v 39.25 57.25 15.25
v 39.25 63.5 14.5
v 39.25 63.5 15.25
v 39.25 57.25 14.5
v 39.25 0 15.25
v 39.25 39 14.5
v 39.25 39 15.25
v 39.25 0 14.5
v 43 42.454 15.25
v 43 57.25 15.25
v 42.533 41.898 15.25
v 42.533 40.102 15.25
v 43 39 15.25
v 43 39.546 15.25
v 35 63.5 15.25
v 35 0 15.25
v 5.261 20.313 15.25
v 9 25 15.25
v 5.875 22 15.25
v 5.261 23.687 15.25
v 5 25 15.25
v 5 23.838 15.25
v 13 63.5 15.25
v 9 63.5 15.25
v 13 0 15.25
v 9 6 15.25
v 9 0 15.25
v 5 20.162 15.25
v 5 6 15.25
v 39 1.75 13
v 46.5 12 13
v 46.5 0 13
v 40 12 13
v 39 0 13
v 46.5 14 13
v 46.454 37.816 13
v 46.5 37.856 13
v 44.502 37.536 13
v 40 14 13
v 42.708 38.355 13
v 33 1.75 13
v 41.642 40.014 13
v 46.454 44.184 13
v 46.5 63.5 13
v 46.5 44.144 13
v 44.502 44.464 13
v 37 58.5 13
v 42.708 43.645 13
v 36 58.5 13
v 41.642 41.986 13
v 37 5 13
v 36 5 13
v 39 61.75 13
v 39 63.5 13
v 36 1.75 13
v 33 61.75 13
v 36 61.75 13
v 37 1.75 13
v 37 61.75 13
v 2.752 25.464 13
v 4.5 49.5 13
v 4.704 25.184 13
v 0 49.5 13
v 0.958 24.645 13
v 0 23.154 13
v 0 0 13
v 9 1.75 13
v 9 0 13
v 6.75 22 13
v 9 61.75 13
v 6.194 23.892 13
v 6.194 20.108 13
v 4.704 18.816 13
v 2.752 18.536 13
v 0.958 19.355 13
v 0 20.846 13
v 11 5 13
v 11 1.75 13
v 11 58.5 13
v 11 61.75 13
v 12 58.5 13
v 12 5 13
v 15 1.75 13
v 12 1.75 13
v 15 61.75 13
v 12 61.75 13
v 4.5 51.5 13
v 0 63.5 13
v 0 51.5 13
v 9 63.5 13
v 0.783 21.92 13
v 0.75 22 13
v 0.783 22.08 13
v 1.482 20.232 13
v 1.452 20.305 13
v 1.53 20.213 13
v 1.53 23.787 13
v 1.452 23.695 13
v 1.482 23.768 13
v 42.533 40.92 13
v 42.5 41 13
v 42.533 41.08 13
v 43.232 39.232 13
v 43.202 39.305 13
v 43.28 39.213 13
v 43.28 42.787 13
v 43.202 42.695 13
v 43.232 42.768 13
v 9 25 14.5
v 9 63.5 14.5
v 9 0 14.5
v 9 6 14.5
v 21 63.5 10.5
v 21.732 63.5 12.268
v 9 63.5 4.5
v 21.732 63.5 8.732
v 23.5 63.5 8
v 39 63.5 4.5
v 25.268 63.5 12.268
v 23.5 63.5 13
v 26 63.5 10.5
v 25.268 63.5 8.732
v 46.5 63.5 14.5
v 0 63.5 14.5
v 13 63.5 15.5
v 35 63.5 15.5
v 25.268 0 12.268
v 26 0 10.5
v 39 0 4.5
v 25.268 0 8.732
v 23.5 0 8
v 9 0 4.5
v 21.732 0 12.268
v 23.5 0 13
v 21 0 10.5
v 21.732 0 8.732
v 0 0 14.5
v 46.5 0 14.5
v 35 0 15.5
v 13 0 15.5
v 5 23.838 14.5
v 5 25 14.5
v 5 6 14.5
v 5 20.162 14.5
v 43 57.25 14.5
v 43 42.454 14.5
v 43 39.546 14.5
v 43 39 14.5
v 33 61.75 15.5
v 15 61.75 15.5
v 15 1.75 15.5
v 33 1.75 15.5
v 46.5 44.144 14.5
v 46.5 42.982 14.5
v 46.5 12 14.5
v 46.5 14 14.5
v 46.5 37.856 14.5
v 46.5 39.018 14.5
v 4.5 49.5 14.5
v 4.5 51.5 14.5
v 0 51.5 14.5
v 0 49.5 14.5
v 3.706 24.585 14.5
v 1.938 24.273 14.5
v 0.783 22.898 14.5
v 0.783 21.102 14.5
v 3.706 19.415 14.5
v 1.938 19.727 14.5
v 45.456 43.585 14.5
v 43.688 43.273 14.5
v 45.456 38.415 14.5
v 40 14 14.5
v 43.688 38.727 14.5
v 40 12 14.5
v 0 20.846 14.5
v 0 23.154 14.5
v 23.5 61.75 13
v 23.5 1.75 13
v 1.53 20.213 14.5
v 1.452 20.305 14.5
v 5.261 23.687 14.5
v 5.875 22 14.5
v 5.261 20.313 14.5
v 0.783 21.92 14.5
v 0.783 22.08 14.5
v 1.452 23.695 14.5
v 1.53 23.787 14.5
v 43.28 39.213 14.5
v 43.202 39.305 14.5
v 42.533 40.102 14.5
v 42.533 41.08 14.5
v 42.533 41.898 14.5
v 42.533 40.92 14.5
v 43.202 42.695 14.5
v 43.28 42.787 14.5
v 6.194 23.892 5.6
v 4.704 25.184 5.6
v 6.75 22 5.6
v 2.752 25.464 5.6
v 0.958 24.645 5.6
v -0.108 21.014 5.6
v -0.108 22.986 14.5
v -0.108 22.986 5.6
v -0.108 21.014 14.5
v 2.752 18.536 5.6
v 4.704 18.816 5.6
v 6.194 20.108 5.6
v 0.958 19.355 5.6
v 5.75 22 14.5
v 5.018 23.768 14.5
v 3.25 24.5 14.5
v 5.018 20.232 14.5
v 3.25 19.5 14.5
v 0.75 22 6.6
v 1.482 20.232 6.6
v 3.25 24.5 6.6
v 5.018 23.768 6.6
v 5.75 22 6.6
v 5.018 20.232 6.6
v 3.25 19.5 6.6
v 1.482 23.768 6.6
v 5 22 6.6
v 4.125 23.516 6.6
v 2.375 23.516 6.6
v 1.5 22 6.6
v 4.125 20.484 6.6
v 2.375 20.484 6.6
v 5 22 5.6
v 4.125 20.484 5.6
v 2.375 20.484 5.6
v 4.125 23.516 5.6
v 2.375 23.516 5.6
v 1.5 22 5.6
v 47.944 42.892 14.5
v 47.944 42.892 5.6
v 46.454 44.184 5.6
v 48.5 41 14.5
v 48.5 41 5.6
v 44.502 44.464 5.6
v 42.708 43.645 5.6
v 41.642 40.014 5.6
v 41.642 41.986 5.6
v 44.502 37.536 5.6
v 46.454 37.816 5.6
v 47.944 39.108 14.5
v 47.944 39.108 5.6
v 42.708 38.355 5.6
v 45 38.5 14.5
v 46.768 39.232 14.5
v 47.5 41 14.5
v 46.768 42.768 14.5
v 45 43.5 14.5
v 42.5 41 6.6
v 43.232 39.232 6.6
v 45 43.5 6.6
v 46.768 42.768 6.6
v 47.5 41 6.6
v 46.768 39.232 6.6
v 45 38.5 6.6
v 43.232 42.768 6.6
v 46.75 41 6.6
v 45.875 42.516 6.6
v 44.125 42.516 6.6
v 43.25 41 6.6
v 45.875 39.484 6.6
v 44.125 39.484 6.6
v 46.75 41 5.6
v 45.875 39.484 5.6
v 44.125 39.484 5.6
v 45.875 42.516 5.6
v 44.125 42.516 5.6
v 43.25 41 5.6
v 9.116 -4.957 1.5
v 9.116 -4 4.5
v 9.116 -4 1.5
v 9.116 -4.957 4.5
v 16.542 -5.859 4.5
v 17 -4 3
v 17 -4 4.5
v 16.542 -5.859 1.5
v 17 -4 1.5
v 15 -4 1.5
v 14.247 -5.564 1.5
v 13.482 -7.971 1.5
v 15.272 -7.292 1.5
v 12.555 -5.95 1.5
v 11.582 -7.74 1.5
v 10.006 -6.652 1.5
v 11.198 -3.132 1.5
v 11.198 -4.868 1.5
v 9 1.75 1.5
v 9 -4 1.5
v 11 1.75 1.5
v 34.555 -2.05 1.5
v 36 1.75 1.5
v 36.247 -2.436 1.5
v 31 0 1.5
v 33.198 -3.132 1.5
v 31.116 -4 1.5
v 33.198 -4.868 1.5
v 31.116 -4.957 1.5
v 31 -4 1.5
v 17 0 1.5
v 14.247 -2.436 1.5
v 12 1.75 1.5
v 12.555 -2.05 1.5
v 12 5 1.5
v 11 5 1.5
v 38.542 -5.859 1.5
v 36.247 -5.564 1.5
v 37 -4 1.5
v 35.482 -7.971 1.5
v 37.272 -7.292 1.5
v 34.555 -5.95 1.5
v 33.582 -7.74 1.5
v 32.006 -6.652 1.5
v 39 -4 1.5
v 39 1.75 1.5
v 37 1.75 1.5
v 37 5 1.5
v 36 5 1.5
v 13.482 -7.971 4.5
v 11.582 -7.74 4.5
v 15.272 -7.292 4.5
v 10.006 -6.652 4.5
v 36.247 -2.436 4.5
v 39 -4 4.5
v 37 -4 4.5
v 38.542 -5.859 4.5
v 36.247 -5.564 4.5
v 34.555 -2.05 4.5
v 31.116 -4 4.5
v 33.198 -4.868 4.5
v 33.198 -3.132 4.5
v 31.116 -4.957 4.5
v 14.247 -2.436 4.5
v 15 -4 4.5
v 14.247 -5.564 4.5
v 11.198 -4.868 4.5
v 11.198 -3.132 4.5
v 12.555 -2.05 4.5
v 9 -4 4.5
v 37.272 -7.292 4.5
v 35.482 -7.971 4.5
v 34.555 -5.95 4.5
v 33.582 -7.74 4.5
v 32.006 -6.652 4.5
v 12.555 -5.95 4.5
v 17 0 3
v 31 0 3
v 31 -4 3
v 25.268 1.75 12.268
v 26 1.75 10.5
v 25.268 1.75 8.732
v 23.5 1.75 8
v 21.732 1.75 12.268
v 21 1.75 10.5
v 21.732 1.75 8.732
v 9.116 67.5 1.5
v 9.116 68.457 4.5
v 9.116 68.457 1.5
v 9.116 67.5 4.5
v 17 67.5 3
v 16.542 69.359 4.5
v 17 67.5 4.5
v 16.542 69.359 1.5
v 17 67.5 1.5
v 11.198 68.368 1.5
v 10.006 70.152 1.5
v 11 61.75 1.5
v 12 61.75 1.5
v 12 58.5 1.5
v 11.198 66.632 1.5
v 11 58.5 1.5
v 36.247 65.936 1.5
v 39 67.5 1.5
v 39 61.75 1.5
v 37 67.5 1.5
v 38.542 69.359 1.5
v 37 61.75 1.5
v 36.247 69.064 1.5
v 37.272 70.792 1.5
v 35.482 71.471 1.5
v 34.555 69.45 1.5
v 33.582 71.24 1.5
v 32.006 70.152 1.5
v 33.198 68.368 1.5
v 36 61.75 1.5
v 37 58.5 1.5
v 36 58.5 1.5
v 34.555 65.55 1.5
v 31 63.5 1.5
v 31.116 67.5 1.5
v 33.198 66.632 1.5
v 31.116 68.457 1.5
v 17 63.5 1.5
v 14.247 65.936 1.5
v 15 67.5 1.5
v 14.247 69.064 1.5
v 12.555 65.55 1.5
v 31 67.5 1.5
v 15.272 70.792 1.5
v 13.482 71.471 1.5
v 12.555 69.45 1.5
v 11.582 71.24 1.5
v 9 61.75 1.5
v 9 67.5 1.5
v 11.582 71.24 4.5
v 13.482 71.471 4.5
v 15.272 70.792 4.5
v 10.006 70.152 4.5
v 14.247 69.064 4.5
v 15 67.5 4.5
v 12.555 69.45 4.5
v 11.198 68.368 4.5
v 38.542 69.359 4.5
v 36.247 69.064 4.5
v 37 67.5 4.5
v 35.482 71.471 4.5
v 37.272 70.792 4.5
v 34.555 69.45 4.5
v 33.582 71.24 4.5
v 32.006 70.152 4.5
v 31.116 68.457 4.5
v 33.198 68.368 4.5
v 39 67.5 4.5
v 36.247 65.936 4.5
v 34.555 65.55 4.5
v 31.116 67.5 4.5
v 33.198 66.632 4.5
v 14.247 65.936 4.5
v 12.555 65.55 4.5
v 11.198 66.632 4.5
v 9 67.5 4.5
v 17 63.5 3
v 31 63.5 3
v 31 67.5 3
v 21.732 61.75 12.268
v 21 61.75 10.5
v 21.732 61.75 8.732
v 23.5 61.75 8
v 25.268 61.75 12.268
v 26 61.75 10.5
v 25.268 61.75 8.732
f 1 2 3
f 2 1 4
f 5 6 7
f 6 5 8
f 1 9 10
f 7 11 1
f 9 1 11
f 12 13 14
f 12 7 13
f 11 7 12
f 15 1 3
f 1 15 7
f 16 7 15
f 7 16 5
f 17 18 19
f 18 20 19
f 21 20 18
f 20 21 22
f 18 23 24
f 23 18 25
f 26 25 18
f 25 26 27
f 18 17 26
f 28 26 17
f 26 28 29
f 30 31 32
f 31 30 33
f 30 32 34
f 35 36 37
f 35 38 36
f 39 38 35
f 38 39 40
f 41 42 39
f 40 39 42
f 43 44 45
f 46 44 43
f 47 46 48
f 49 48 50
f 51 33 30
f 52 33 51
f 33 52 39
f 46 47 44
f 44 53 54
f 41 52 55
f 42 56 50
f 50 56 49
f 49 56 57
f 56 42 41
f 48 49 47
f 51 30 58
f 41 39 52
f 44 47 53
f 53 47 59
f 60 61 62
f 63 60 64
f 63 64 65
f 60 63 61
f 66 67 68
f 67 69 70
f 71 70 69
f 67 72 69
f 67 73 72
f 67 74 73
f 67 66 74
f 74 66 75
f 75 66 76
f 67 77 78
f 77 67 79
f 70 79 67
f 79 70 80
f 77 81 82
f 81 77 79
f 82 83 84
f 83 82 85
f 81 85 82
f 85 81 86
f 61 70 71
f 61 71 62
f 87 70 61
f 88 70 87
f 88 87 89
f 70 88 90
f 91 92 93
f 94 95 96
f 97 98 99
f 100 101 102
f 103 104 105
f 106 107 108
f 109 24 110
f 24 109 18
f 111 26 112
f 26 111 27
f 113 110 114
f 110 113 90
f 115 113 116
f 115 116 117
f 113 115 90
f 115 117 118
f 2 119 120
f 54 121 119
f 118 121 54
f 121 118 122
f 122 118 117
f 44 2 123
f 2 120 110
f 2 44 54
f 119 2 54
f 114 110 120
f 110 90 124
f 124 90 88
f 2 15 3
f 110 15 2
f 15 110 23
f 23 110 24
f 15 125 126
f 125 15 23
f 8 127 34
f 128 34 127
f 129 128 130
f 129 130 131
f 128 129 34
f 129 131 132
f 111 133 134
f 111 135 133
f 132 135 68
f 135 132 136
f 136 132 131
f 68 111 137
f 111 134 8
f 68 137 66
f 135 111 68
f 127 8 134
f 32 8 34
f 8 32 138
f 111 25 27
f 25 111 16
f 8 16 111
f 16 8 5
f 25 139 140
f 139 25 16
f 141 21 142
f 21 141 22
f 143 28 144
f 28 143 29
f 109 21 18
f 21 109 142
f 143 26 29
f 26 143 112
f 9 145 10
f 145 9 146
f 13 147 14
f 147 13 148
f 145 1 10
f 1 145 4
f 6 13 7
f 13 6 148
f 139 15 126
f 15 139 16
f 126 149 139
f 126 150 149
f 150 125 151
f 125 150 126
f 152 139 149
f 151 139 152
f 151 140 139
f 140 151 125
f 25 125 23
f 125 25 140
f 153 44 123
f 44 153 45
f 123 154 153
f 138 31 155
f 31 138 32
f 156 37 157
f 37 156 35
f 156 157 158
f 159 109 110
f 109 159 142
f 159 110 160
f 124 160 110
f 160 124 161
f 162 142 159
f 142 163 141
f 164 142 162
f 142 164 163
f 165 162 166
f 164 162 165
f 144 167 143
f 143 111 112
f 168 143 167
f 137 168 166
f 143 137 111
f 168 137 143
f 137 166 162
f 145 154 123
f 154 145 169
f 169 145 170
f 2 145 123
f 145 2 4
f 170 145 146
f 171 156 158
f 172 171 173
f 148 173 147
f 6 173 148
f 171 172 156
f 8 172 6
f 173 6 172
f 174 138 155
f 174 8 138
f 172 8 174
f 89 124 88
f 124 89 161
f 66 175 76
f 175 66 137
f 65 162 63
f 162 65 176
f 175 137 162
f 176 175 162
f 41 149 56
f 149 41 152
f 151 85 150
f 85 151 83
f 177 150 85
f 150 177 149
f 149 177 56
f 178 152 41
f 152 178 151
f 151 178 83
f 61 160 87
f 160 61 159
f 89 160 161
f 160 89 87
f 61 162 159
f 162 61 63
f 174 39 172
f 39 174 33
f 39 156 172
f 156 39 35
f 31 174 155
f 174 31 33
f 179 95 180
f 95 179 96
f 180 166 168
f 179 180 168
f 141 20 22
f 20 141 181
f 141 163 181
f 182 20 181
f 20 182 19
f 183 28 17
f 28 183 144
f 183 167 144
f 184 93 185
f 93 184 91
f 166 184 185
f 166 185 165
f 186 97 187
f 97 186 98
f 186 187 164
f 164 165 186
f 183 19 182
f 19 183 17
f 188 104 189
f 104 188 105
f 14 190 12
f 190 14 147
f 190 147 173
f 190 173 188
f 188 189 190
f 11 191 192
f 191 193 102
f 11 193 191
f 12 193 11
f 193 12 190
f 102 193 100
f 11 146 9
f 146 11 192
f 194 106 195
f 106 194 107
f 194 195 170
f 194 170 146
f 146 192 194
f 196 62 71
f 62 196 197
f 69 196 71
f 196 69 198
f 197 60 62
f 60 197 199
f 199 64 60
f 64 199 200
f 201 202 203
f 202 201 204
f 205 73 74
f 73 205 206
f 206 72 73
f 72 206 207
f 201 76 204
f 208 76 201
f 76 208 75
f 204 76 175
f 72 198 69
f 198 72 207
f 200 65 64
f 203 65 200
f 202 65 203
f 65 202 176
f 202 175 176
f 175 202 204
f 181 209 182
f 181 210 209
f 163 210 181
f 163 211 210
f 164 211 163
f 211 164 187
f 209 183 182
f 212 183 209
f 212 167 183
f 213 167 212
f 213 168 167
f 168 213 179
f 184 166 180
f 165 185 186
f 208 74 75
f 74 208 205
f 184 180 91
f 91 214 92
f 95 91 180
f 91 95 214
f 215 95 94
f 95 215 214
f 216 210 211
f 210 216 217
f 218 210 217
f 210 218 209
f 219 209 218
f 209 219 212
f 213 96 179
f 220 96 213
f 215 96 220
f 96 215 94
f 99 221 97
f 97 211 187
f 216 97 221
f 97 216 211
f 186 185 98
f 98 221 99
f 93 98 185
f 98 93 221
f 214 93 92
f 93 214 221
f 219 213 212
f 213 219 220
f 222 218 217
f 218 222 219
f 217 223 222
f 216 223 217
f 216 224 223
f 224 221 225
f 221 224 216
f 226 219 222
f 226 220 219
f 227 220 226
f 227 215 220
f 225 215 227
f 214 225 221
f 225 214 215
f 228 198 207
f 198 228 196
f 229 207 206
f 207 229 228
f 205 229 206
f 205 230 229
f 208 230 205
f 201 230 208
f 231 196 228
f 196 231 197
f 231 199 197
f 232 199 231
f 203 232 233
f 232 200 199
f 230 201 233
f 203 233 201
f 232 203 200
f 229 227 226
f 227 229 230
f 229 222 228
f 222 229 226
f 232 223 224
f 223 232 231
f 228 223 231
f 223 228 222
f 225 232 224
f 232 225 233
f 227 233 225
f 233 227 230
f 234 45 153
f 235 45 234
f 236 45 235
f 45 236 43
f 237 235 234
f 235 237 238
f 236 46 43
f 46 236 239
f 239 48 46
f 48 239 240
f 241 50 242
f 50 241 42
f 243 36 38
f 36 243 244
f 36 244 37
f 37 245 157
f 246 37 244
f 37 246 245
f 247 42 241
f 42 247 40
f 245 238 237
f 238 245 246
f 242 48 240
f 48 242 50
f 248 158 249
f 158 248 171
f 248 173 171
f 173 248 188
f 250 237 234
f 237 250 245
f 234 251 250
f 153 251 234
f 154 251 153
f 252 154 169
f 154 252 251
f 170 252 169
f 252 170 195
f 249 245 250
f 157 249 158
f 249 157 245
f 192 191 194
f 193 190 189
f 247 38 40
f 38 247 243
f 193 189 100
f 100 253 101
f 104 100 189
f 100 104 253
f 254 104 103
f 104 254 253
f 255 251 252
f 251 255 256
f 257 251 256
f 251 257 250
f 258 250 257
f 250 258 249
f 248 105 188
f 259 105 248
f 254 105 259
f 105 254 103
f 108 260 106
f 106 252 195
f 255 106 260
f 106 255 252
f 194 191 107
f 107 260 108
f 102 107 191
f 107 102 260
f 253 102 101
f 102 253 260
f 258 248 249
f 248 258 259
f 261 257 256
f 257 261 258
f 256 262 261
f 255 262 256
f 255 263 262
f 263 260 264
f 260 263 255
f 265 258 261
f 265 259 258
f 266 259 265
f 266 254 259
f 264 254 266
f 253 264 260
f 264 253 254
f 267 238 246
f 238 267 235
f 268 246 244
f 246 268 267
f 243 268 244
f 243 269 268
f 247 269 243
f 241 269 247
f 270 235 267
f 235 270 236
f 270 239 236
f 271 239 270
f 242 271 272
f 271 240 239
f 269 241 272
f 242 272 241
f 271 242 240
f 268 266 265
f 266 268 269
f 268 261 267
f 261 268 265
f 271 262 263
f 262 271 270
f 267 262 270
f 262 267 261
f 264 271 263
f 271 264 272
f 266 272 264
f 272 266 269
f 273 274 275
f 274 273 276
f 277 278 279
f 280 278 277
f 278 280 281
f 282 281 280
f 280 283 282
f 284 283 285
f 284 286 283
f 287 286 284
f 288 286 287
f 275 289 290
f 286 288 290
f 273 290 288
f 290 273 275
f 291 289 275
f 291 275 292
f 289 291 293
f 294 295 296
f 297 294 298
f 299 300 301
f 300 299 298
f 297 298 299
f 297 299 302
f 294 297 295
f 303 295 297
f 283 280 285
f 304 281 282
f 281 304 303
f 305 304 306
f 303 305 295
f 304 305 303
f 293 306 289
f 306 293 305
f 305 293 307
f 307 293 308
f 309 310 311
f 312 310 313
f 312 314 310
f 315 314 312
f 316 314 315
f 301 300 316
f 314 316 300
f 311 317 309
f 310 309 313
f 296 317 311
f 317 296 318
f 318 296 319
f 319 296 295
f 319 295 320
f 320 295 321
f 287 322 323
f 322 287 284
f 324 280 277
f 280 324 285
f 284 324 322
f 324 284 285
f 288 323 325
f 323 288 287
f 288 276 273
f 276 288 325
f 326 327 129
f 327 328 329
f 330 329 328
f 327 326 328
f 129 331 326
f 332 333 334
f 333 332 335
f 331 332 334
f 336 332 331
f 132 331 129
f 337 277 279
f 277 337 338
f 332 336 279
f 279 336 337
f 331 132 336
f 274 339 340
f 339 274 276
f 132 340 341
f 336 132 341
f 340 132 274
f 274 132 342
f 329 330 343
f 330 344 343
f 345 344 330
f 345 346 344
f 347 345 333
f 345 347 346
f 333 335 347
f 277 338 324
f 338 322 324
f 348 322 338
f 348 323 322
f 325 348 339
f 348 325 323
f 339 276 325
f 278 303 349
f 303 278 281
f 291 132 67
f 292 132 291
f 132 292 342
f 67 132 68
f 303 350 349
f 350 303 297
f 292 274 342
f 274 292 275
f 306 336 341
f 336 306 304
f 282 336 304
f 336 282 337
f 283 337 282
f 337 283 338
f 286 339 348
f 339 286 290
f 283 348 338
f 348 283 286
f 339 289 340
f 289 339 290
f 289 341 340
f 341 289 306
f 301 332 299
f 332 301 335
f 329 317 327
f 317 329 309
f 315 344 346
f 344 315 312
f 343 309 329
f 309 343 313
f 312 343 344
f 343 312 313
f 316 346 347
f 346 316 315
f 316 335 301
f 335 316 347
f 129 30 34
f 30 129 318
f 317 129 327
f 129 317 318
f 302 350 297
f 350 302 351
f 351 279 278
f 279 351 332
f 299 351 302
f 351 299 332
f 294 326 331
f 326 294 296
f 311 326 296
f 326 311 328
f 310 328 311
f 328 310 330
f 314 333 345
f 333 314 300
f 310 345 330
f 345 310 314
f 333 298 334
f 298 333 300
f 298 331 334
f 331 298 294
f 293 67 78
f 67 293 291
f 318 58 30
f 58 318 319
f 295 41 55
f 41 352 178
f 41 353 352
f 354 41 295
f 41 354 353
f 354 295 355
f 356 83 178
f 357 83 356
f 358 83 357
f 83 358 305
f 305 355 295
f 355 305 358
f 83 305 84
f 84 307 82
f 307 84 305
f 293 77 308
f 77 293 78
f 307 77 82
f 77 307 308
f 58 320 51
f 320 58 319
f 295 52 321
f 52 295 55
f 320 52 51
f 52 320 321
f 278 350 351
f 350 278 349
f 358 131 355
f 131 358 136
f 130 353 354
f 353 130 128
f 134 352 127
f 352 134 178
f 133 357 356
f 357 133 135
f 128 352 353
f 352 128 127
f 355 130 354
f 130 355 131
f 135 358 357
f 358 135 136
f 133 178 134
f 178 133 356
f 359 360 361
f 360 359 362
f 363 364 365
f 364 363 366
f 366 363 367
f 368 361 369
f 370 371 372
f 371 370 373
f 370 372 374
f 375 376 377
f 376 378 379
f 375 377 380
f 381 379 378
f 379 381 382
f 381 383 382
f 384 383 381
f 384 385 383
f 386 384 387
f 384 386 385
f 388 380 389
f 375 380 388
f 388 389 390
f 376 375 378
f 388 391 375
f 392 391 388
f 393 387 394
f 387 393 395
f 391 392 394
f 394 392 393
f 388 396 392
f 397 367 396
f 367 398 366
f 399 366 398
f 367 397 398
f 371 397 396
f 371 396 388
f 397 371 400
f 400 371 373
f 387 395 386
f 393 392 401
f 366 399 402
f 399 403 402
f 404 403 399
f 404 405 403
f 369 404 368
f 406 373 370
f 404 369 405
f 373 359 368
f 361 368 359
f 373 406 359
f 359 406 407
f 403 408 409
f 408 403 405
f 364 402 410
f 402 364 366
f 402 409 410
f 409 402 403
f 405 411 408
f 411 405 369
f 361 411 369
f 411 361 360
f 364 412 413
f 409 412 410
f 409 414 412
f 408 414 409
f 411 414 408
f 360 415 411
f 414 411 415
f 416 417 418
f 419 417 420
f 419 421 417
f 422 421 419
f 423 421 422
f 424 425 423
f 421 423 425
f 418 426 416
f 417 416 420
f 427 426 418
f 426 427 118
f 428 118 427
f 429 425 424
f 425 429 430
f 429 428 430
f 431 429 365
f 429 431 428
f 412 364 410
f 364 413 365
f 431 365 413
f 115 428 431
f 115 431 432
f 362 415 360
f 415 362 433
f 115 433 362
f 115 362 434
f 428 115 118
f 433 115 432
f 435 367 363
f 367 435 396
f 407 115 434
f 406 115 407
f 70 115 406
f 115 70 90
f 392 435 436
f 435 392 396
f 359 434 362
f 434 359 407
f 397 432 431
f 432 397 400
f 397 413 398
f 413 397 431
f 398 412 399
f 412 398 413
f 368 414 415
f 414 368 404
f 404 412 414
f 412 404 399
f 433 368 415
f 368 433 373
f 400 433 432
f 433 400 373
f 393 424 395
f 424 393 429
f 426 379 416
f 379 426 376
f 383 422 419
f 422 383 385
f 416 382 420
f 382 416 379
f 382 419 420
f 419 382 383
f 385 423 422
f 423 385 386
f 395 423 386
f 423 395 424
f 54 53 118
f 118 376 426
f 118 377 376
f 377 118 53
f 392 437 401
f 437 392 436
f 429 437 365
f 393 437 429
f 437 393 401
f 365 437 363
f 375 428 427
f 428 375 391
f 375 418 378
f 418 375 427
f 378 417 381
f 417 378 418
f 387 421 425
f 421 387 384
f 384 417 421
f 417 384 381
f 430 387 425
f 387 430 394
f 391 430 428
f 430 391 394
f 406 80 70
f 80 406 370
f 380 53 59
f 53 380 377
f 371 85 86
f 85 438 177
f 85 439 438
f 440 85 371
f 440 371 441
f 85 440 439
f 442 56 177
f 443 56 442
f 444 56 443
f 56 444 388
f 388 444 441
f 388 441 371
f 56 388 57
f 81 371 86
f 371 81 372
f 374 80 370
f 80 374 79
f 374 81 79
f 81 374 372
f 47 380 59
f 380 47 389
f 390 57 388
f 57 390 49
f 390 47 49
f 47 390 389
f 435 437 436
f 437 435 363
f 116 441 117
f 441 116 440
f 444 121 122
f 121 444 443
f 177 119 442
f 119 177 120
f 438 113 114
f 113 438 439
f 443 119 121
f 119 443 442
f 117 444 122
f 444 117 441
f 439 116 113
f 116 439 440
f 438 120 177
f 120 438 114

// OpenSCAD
module plate() {
    plateLength = 63.5;
    plateWidth = 46.5;
    plateHeight = 1.5;

    difference() {
        union() {
            translate([13, 0, 0])   color("white") cube([22, plateLength, plateHeight + 1], false);
            union() {
                translate([9, 0, 0])    color("grey") cube([30.25, plateLength, plateHeight + 0.75], false);
                translate([5, 6, 0])    color("grey") cube([4, 19, plateHeight + 0.75], false);
                translate([39, 39, 0])  color("grey") cube([4, 18.25, plateHeight + 0.75], false);
            }
            cube([plateWidth, plateLength, plateHeight], false);
        }
        translate([15, 1.75, 0]) cube([18, plateLength - 3.5, 4], false);

        translate([0, 49.5, 0]) cube([4.5, 2, plateHeight], false);
        translate([40, 12, 0]) cube([6.5, 2, plateHeight], false);
        
        translate([3.25, 22, 0]) cylinder(r=2.625, h=10, center=true);
        translate([45, 41, 0]) cylinder(r=2.625, h=10, center=true);
    }
}

module raisedScrewHole() {
    difference() {
        union() {
            cylinder(3, r=4);
            translate([-4, 0, 0]) cube([8, 4, 3], false);
        }
        
        // translate([0, 0, 1]) cylinder(2, r=3);
        cylinder(3, r=2);
    }
}

module brace() {
    difference() {
        union() {
            cube([30, 1.75, 11.5], false);
            translate([2, 0, 0]) cube([1, 5, 11.5], false);
            translate([27, 0, 0]) cube([1, 5, 11.5], false);

            translate([4, -4, 8.5]) raisedScrewHole();
            translate([26, -4, 8.5]) raisedScrewHole();

            translate([8, -4, 8.5]) cube([14, 4, 1.5], false);
        }

        translate([14.5, 0, 2.5]) rotate([90, 90, 0]) cylinder(r=2.5, h=4, center=true);
    }

}

module screwOffset() {
    union() {
        difference() {
            cylinder(r=3.5, h=8.4, center=true);
            cylinder(r=2.5, h=8.4, center=true);
        }
        translate([0, 0, -4.2]) difference() {
            cylinder(r=3.5, h=1, center=true);
            cylinder(r=1.75, h=1, center=true);
        }
        
    }
}

translate([0, 0, 13]) {
    plate();
    translate([3.25, 22, -2.70]) screwOffset();
    translate([45, 41, -2.70]) screwOffset();
}


translate([9, 0, 13]) mirror([0, 0, 1]) union() {
    brace();
    //translate([9, -2, 8.5]) cube([12, 2.75, 16.75], false);
}
translate([9, 63.5,  13]) mirror([0, 1, 0]) mirror([0, 0, 1]) brace();
